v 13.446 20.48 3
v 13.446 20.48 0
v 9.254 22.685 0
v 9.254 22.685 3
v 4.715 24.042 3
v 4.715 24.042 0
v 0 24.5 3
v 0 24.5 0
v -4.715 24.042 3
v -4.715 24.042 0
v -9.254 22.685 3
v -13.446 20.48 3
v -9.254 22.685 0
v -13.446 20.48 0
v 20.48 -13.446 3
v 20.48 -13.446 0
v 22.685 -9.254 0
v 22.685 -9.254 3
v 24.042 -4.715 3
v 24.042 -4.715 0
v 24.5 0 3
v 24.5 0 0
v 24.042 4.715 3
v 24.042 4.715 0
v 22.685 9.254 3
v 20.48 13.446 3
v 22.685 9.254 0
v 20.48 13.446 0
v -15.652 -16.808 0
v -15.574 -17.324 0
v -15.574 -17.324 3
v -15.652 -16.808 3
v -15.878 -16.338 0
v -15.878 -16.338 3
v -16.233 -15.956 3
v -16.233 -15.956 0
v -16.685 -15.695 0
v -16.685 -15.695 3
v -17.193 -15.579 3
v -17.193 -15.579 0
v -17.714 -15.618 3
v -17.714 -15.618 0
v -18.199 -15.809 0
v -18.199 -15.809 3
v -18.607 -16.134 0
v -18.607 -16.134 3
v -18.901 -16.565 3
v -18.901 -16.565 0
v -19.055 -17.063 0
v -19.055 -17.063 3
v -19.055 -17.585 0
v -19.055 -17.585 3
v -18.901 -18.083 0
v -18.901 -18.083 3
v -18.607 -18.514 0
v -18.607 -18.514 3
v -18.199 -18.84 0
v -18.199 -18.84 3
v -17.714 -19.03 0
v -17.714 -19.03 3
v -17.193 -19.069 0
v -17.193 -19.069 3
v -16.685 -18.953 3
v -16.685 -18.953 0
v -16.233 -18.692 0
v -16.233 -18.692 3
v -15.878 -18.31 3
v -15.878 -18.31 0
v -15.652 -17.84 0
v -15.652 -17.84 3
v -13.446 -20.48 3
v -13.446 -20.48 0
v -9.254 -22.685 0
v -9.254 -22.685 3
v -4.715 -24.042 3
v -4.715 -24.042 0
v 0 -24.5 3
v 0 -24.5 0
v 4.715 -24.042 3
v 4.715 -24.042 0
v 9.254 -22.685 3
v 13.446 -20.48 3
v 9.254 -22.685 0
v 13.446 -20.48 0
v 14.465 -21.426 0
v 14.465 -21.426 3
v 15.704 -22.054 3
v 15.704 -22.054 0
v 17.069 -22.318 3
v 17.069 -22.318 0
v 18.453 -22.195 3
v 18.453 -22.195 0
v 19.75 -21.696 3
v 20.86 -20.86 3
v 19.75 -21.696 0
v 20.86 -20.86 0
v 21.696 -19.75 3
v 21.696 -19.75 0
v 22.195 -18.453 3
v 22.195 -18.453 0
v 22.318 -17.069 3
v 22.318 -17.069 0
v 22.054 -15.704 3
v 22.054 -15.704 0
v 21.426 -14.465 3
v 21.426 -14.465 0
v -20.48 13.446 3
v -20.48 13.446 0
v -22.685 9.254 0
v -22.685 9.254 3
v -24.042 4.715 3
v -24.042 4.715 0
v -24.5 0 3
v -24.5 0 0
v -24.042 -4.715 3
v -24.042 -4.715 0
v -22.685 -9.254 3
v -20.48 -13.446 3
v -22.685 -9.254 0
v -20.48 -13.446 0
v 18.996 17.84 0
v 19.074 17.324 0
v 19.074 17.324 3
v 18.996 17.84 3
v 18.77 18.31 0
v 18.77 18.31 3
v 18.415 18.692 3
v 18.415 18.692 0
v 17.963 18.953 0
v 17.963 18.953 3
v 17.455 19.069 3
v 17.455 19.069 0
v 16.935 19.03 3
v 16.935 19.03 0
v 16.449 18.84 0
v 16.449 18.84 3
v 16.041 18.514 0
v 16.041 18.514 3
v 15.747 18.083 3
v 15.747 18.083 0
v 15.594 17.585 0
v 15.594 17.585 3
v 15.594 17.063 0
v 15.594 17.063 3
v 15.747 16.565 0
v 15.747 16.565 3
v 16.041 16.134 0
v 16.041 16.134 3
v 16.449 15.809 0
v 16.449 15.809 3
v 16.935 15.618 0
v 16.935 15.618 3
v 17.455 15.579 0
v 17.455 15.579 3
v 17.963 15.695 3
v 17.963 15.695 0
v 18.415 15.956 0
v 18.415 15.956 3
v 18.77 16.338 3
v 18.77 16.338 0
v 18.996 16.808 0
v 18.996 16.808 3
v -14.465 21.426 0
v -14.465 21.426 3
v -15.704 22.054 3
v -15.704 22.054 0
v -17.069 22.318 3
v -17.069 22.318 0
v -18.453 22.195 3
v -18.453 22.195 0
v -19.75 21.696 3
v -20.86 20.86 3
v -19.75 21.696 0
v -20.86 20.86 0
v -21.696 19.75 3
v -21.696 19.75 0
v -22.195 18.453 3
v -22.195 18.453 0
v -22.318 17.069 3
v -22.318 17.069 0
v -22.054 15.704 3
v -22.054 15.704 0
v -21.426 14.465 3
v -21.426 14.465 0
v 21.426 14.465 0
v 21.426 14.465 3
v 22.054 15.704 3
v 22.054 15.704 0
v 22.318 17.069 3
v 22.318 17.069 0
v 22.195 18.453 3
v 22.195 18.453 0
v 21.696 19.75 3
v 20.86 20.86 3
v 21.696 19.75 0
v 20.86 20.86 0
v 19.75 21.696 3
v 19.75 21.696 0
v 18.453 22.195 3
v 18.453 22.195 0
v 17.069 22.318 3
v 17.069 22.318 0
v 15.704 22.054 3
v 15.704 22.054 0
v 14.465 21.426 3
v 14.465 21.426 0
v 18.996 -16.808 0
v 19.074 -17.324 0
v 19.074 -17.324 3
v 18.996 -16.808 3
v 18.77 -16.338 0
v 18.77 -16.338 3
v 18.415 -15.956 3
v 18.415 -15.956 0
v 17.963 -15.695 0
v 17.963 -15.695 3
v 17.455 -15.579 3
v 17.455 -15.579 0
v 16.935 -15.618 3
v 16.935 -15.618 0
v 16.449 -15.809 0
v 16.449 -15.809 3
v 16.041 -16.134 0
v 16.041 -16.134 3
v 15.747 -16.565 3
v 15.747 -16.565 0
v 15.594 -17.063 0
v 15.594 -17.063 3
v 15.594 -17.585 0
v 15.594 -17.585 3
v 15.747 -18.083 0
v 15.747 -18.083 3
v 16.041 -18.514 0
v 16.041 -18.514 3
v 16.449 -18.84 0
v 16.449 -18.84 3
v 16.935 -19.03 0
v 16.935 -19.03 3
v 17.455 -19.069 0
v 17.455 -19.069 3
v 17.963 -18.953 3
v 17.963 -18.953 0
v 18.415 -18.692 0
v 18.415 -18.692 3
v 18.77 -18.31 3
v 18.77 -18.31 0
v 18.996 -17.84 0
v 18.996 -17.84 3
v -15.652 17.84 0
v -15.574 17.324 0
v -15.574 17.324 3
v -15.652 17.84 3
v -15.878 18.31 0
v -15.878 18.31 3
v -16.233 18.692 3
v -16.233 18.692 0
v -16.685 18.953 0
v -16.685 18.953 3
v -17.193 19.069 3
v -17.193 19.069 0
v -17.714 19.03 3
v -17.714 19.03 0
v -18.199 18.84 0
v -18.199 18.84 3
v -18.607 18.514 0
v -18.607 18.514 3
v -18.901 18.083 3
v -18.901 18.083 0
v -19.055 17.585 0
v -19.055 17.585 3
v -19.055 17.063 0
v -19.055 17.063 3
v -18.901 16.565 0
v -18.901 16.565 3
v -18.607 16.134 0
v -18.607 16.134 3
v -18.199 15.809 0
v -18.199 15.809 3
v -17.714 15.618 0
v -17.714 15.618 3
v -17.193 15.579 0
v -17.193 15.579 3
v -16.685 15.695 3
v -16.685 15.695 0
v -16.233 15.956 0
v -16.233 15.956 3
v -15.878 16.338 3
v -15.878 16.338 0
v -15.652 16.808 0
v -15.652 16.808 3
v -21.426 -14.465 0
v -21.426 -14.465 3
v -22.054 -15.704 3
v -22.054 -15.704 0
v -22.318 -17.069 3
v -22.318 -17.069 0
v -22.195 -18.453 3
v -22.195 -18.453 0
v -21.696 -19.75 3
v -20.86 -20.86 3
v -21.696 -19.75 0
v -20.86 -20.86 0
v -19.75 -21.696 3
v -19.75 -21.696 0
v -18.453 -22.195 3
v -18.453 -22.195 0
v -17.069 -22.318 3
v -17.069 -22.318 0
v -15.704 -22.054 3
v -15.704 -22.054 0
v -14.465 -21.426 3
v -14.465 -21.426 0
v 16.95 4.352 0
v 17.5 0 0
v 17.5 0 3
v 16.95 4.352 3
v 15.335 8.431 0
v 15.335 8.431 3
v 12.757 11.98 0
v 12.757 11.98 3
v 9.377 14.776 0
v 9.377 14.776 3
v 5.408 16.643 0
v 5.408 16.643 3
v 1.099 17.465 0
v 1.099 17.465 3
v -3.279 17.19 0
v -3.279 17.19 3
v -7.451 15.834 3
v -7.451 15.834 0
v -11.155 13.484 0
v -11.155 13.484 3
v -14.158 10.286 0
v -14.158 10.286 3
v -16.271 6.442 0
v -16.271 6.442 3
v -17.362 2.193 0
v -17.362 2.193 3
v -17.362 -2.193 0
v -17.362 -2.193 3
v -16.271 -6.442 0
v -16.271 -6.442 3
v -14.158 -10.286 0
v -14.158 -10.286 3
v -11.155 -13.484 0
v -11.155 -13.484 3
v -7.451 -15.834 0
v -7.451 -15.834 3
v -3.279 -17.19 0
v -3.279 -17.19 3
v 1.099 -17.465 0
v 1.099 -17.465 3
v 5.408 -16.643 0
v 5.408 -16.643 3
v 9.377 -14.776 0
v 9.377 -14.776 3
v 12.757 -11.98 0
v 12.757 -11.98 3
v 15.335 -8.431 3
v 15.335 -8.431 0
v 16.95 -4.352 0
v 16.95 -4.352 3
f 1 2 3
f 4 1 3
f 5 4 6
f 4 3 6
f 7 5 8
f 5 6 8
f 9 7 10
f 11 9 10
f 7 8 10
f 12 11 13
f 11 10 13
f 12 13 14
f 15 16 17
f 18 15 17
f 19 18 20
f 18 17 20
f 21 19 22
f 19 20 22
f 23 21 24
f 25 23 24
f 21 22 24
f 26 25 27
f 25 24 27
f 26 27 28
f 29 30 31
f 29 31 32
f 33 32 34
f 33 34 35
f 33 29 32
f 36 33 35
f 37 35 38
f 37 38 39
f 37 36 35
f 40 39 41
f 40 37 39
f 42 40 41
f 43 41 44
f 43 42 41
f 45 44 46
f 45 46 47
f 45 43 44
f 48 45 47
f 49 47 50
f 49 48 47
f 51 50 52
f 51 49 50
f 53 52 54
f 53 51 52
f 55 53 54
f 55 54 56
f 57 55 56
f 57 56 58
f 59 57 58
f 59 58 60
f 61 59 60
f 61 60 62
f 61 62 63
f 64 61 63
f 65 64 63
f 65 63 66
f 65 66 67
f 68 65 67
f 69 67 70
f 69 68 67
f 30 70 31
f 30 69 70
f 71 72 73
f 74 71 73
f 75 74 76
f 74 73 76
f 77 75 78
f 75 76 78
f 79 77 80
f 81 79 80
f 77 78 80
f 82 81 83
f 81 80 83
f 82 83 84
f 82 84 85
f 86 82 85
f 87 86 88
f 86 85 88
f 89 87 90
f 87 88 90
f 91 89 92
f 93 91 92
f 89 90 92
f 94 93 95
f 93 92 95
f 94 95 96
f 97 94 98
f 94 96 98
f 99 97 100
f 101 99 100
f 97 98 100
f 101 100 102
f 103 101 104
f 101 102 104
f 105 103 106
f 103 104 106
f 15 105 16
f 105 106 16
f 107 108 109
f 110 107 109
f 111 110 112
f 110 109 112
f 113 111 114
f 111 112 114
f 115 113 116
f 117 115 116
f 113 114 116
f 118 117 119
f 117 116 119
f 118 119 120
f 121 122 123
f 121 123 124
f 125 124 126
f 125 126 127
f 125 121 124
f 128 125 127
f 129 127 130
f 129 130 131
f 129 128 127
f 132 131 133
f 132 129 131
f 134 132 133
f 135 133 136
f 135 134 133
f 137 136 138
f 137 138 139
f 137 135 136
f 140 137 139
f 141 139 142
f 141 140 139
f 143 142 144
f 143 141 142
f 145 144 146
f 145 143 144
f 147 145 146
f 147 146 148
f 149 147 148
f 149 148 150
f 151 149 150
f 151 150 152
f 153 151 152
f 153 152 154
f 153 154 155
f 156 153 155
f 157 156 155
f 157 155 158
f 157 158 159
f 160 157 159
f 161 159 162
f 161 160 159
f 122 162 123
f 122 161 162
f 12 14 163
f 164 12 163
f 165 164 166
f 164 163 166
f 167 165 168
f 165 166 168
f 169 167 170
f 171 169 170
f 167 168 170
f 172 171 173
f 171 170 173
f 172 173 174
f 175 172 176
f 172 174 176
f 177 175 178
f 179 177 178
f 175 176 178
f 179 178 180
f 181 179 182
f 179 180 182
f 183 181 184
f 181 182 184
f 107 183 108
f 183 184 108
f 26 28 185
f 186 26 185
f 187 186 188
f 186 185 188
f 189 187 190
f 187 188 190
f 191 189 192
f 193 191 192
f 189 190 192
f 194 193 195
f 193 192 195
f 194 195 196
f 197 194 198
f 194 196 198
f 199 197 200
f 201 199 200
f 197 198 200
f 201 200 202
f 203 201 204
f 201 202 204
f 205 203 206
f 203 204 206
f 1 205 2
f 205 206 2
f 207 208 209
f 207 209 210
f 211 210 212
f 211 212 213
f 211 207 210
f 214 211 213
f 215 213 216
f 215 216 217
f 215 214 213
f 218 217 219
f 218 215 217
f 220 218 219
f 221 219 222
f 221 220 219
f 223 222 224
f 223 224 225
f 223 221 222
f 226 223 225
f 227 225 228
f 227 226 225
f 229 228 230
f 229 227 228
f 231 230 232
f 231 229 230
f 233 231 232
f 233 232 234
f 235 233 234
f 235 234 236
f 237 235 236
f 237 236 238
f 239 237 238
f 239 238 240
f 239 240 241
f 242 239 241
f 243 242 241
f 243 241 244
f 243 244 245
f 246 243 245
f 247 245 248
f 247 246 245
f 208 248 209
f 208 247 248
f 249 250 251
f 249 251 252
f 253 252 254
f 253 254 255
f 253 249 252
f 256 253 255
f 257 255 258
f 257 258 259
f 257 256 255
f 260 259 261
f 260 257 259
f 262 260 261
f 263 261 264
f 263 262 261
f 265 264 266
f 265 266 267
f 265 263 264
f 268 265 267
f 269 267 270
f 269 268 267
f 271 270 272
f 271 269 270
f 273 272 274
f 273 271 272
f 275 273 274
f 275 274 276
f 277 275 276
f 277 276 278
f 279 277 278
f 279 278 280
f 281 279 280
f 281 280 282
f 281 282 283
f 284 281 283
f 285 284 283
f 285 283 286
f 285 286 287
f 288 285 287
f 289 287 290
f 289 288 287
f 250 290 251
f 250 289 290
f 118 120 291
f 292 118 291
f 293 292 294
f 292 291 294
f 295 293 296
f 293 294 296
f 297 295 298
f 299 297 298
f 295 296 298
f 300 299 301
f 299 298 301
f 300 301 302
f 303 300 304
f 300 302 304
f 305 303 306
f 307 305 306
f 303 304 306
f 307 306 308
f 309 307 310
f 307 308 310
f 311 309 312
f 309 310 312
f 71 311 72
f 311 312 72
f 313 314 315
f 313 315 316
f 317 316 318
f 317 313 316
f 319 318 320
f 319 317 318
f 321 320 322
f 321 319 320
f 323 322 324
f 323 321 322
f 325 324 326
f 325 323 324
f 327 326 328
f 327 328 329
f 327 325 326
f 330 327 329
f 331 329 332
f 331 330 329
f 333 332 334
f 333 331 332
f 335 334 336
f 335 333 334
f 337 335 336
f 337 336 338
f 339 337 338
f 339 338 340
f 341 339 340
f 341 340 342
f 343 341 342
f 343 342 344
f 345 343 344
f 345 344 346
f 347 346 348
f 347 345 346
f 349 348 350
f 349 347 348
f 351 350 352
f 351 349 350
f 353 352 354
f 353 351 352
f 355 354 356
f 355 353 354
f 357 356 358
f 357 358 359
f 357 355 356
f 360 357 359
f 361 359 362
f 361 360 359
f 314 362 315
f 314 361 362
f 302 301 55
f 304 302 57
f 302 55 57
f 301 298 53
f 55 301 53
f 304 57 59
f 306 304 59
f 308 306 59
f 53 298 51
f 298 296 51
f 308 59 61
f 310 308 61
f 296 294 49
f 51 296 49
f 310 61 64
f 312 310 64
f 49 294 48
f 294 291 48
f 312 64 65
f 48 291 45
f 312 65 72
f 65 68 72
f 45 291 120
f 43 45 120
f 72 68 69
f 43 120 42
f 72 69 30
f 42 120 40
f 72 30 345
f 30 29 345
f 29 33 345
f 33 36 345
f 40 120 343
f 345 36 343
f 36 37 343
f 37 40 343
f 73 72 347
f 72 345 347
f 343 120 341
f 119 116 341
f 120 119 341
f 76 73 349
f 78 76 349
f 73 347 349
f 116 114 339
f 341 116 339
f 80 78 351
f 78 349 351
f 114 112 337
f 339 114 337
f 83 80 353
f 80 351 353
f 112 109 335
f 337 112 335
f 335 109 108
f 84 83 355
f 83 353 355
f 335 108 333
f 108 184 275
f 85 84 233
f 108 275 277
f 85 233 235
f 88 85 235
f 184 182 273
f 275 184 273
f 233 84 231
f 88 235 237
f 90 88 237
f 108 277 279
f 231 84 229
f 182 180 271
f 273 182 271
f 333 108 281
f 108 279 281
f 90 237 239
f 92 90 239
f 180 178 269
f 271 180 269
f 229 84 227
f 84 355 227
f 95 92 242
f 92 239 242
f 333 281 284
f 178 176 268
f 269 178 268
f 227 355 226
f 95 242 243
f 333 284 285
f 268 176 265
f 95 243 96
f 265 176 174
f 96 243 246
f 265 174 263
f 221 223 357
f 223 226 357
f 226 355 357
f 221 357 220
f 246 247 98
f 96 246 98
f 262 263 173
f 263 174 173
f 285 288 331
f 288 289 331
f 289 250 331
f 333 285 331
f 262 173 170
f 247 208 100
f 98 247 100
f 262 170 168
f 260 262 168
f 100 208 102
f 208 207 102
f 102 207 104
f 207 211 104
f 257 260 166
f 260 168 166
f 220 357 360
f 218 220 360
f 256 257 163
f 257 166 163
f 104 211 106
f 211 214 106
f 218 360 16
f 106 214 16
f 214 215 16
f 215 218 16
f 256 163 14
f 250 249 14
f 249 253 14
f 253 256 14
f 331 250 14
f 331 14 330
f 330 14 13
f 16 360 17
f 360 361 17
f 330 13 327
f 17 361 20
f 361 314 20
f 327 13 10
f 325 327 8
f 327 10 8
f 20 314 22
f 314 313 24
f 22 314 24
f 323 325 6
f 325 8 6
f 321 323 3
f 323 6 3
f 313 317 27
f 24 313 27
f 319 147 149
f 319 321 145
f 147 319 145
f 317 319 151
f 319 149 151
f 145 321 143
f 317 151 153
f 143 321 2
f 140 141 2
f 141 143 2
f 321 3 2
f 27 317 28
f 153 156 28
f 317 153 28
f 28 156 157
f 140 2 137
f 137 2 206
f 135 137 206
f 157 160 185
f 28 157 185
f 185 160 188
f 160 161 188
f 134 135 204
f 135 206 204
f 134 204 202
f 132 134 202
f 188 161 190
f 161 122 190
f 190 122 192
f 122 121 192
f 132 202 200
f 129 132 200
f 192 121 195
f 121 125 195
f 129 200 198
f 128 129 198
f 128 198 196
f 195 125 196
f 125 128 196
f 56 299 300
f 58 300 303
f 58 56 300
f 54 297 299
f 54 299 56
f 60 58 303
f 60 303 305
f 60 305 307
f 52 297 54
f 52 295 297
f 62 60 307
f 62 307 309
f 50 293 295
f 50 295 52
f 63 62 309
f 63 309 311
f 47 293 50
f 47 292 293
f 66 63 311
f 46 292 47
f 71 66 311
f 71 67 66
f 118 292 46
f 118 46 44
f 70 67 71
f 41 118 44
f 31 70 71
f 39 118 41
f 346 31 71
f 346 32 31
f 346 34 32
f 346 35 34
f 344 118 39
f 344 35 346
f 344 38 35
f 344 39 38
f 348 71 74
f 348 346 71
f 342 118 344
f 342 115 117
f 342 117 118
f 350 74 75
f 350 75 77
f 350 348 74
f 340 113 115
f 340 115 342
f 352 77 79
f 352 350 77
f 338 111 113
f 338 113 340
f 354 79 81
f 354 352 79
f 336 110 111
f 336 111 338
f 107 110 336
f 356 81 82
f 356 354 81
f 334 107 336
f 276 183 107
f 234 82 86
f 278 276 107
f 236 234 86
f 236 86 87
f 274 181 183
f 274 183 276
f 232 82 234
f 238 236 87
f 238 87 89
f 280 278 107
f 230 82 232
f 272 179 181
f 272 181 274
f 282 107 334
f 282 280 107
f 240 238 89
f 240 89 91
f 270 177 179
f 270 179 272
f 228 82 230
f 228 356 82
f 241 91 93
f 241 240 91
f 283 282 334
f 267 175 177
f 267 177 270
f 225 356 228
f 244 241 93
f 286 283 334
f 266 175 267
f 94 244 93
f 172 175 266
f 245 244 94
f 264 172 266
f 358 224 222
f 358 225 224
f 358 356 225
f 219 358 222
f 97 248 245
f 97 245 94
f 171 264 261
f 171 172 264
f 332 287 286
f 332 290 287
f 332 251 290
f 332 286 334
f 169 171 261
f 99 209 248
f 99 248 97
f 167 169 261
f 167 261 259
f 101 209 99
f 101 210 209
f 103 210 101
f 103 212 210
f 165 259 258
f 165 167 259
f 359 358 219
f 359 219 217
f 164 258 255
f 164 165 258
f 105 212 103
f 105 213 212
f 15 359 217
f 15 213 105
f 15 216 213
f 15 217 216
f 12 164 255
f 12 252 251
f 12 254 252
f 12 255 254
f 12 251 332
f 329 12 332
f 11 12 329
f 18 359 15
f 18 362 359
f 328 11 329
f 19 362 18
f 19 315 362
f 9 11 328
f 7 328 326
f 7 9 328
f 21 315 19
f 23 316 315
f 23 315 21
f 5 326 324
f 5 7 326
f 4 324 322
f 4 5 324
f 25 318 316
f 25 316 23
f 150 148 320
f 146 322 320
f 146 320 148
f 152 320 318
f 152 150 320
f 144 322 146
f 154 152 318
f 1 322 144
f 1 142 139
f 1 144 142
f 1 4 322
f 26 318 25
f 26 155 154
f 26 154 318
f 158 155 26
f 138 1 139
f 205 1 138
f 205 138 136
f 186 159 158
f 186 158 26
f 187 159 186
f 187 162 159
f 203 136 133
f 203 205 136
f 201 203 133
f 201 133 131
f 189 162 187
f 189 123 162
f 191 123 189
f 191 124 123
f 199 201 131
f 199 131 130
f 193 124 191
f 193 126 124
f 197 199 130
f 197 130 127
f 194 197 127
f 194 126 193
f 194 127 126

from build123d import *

# Parameters (mm, degrees)
SKETCH_1_R      = 17.5
SKETCH_1_R_2    = 1.75
EXTRUDE_1_DEPTH = 3


with BuildPart() as part:
    # 草图1 → 凸台-拉伸1 (new body)
    with BuildSketch(Plane.XY):
        with BuildLine():
            ThreePointArc((-13.446268202, 20.480426545), (-20.859650045, 20.859650045), (-20.480426545, 13.446268202))
            ThreePointArc((-20.480426545, 13.446268202), (-24.5, 0), (-20.480426545, -13.446268202))
            ThreePointArc((-20.480426545, -13.446268202), (-20.859650045, -20.859650045), (-13.446268202, -20.480426545))
            ThreePointArc((-13.446268202, -20.480426545), (0, -24.5), (13.446268202, -20.480426545))
            ThreePointArc((13.446268202, -20.480426545), (20.859650045, -20.859650045), (20.480426545, -13.446268202))
            ThreePointArc((20.480426545, -13.446268202), (24.5, 0), (20.480426545, 13.446268202))
            ThreePointArc((20.480426545, 13.446268202), (20.859650045, 20.859650045), (13.446268202, 20.480426545))
            ThreePointArc((13.446268202, 20.480426545), (0, 24.5), (-13.446268202, 20.480426545))
        make_face()
        Circle(SKETCH_1_R, mode=Mode.SUBTRACT)
        with Locations((-17.324116139, 17.324116139)):
            Circle(SKETCH_1_R_2, mode=Mode.SUBTRACT)
        with Locations((17.324116139, 17.324116139)):
            Circle(SKETCH_1_R_2, mode=Mode.SUBTRACT)
        with Locations((17.324116139, -17.324116139)):
            Circle(SKETCH_1_R_2, mode=Mode.SUBTRACT)
        with Locations((-17.324116139, -17.324116139)):
            Circle(SKETCH_1_R_2, mode=Mode.SUBTRACT)
    extrude(amount=EXTRUDE_1_DEPTH)


solid = part.part
